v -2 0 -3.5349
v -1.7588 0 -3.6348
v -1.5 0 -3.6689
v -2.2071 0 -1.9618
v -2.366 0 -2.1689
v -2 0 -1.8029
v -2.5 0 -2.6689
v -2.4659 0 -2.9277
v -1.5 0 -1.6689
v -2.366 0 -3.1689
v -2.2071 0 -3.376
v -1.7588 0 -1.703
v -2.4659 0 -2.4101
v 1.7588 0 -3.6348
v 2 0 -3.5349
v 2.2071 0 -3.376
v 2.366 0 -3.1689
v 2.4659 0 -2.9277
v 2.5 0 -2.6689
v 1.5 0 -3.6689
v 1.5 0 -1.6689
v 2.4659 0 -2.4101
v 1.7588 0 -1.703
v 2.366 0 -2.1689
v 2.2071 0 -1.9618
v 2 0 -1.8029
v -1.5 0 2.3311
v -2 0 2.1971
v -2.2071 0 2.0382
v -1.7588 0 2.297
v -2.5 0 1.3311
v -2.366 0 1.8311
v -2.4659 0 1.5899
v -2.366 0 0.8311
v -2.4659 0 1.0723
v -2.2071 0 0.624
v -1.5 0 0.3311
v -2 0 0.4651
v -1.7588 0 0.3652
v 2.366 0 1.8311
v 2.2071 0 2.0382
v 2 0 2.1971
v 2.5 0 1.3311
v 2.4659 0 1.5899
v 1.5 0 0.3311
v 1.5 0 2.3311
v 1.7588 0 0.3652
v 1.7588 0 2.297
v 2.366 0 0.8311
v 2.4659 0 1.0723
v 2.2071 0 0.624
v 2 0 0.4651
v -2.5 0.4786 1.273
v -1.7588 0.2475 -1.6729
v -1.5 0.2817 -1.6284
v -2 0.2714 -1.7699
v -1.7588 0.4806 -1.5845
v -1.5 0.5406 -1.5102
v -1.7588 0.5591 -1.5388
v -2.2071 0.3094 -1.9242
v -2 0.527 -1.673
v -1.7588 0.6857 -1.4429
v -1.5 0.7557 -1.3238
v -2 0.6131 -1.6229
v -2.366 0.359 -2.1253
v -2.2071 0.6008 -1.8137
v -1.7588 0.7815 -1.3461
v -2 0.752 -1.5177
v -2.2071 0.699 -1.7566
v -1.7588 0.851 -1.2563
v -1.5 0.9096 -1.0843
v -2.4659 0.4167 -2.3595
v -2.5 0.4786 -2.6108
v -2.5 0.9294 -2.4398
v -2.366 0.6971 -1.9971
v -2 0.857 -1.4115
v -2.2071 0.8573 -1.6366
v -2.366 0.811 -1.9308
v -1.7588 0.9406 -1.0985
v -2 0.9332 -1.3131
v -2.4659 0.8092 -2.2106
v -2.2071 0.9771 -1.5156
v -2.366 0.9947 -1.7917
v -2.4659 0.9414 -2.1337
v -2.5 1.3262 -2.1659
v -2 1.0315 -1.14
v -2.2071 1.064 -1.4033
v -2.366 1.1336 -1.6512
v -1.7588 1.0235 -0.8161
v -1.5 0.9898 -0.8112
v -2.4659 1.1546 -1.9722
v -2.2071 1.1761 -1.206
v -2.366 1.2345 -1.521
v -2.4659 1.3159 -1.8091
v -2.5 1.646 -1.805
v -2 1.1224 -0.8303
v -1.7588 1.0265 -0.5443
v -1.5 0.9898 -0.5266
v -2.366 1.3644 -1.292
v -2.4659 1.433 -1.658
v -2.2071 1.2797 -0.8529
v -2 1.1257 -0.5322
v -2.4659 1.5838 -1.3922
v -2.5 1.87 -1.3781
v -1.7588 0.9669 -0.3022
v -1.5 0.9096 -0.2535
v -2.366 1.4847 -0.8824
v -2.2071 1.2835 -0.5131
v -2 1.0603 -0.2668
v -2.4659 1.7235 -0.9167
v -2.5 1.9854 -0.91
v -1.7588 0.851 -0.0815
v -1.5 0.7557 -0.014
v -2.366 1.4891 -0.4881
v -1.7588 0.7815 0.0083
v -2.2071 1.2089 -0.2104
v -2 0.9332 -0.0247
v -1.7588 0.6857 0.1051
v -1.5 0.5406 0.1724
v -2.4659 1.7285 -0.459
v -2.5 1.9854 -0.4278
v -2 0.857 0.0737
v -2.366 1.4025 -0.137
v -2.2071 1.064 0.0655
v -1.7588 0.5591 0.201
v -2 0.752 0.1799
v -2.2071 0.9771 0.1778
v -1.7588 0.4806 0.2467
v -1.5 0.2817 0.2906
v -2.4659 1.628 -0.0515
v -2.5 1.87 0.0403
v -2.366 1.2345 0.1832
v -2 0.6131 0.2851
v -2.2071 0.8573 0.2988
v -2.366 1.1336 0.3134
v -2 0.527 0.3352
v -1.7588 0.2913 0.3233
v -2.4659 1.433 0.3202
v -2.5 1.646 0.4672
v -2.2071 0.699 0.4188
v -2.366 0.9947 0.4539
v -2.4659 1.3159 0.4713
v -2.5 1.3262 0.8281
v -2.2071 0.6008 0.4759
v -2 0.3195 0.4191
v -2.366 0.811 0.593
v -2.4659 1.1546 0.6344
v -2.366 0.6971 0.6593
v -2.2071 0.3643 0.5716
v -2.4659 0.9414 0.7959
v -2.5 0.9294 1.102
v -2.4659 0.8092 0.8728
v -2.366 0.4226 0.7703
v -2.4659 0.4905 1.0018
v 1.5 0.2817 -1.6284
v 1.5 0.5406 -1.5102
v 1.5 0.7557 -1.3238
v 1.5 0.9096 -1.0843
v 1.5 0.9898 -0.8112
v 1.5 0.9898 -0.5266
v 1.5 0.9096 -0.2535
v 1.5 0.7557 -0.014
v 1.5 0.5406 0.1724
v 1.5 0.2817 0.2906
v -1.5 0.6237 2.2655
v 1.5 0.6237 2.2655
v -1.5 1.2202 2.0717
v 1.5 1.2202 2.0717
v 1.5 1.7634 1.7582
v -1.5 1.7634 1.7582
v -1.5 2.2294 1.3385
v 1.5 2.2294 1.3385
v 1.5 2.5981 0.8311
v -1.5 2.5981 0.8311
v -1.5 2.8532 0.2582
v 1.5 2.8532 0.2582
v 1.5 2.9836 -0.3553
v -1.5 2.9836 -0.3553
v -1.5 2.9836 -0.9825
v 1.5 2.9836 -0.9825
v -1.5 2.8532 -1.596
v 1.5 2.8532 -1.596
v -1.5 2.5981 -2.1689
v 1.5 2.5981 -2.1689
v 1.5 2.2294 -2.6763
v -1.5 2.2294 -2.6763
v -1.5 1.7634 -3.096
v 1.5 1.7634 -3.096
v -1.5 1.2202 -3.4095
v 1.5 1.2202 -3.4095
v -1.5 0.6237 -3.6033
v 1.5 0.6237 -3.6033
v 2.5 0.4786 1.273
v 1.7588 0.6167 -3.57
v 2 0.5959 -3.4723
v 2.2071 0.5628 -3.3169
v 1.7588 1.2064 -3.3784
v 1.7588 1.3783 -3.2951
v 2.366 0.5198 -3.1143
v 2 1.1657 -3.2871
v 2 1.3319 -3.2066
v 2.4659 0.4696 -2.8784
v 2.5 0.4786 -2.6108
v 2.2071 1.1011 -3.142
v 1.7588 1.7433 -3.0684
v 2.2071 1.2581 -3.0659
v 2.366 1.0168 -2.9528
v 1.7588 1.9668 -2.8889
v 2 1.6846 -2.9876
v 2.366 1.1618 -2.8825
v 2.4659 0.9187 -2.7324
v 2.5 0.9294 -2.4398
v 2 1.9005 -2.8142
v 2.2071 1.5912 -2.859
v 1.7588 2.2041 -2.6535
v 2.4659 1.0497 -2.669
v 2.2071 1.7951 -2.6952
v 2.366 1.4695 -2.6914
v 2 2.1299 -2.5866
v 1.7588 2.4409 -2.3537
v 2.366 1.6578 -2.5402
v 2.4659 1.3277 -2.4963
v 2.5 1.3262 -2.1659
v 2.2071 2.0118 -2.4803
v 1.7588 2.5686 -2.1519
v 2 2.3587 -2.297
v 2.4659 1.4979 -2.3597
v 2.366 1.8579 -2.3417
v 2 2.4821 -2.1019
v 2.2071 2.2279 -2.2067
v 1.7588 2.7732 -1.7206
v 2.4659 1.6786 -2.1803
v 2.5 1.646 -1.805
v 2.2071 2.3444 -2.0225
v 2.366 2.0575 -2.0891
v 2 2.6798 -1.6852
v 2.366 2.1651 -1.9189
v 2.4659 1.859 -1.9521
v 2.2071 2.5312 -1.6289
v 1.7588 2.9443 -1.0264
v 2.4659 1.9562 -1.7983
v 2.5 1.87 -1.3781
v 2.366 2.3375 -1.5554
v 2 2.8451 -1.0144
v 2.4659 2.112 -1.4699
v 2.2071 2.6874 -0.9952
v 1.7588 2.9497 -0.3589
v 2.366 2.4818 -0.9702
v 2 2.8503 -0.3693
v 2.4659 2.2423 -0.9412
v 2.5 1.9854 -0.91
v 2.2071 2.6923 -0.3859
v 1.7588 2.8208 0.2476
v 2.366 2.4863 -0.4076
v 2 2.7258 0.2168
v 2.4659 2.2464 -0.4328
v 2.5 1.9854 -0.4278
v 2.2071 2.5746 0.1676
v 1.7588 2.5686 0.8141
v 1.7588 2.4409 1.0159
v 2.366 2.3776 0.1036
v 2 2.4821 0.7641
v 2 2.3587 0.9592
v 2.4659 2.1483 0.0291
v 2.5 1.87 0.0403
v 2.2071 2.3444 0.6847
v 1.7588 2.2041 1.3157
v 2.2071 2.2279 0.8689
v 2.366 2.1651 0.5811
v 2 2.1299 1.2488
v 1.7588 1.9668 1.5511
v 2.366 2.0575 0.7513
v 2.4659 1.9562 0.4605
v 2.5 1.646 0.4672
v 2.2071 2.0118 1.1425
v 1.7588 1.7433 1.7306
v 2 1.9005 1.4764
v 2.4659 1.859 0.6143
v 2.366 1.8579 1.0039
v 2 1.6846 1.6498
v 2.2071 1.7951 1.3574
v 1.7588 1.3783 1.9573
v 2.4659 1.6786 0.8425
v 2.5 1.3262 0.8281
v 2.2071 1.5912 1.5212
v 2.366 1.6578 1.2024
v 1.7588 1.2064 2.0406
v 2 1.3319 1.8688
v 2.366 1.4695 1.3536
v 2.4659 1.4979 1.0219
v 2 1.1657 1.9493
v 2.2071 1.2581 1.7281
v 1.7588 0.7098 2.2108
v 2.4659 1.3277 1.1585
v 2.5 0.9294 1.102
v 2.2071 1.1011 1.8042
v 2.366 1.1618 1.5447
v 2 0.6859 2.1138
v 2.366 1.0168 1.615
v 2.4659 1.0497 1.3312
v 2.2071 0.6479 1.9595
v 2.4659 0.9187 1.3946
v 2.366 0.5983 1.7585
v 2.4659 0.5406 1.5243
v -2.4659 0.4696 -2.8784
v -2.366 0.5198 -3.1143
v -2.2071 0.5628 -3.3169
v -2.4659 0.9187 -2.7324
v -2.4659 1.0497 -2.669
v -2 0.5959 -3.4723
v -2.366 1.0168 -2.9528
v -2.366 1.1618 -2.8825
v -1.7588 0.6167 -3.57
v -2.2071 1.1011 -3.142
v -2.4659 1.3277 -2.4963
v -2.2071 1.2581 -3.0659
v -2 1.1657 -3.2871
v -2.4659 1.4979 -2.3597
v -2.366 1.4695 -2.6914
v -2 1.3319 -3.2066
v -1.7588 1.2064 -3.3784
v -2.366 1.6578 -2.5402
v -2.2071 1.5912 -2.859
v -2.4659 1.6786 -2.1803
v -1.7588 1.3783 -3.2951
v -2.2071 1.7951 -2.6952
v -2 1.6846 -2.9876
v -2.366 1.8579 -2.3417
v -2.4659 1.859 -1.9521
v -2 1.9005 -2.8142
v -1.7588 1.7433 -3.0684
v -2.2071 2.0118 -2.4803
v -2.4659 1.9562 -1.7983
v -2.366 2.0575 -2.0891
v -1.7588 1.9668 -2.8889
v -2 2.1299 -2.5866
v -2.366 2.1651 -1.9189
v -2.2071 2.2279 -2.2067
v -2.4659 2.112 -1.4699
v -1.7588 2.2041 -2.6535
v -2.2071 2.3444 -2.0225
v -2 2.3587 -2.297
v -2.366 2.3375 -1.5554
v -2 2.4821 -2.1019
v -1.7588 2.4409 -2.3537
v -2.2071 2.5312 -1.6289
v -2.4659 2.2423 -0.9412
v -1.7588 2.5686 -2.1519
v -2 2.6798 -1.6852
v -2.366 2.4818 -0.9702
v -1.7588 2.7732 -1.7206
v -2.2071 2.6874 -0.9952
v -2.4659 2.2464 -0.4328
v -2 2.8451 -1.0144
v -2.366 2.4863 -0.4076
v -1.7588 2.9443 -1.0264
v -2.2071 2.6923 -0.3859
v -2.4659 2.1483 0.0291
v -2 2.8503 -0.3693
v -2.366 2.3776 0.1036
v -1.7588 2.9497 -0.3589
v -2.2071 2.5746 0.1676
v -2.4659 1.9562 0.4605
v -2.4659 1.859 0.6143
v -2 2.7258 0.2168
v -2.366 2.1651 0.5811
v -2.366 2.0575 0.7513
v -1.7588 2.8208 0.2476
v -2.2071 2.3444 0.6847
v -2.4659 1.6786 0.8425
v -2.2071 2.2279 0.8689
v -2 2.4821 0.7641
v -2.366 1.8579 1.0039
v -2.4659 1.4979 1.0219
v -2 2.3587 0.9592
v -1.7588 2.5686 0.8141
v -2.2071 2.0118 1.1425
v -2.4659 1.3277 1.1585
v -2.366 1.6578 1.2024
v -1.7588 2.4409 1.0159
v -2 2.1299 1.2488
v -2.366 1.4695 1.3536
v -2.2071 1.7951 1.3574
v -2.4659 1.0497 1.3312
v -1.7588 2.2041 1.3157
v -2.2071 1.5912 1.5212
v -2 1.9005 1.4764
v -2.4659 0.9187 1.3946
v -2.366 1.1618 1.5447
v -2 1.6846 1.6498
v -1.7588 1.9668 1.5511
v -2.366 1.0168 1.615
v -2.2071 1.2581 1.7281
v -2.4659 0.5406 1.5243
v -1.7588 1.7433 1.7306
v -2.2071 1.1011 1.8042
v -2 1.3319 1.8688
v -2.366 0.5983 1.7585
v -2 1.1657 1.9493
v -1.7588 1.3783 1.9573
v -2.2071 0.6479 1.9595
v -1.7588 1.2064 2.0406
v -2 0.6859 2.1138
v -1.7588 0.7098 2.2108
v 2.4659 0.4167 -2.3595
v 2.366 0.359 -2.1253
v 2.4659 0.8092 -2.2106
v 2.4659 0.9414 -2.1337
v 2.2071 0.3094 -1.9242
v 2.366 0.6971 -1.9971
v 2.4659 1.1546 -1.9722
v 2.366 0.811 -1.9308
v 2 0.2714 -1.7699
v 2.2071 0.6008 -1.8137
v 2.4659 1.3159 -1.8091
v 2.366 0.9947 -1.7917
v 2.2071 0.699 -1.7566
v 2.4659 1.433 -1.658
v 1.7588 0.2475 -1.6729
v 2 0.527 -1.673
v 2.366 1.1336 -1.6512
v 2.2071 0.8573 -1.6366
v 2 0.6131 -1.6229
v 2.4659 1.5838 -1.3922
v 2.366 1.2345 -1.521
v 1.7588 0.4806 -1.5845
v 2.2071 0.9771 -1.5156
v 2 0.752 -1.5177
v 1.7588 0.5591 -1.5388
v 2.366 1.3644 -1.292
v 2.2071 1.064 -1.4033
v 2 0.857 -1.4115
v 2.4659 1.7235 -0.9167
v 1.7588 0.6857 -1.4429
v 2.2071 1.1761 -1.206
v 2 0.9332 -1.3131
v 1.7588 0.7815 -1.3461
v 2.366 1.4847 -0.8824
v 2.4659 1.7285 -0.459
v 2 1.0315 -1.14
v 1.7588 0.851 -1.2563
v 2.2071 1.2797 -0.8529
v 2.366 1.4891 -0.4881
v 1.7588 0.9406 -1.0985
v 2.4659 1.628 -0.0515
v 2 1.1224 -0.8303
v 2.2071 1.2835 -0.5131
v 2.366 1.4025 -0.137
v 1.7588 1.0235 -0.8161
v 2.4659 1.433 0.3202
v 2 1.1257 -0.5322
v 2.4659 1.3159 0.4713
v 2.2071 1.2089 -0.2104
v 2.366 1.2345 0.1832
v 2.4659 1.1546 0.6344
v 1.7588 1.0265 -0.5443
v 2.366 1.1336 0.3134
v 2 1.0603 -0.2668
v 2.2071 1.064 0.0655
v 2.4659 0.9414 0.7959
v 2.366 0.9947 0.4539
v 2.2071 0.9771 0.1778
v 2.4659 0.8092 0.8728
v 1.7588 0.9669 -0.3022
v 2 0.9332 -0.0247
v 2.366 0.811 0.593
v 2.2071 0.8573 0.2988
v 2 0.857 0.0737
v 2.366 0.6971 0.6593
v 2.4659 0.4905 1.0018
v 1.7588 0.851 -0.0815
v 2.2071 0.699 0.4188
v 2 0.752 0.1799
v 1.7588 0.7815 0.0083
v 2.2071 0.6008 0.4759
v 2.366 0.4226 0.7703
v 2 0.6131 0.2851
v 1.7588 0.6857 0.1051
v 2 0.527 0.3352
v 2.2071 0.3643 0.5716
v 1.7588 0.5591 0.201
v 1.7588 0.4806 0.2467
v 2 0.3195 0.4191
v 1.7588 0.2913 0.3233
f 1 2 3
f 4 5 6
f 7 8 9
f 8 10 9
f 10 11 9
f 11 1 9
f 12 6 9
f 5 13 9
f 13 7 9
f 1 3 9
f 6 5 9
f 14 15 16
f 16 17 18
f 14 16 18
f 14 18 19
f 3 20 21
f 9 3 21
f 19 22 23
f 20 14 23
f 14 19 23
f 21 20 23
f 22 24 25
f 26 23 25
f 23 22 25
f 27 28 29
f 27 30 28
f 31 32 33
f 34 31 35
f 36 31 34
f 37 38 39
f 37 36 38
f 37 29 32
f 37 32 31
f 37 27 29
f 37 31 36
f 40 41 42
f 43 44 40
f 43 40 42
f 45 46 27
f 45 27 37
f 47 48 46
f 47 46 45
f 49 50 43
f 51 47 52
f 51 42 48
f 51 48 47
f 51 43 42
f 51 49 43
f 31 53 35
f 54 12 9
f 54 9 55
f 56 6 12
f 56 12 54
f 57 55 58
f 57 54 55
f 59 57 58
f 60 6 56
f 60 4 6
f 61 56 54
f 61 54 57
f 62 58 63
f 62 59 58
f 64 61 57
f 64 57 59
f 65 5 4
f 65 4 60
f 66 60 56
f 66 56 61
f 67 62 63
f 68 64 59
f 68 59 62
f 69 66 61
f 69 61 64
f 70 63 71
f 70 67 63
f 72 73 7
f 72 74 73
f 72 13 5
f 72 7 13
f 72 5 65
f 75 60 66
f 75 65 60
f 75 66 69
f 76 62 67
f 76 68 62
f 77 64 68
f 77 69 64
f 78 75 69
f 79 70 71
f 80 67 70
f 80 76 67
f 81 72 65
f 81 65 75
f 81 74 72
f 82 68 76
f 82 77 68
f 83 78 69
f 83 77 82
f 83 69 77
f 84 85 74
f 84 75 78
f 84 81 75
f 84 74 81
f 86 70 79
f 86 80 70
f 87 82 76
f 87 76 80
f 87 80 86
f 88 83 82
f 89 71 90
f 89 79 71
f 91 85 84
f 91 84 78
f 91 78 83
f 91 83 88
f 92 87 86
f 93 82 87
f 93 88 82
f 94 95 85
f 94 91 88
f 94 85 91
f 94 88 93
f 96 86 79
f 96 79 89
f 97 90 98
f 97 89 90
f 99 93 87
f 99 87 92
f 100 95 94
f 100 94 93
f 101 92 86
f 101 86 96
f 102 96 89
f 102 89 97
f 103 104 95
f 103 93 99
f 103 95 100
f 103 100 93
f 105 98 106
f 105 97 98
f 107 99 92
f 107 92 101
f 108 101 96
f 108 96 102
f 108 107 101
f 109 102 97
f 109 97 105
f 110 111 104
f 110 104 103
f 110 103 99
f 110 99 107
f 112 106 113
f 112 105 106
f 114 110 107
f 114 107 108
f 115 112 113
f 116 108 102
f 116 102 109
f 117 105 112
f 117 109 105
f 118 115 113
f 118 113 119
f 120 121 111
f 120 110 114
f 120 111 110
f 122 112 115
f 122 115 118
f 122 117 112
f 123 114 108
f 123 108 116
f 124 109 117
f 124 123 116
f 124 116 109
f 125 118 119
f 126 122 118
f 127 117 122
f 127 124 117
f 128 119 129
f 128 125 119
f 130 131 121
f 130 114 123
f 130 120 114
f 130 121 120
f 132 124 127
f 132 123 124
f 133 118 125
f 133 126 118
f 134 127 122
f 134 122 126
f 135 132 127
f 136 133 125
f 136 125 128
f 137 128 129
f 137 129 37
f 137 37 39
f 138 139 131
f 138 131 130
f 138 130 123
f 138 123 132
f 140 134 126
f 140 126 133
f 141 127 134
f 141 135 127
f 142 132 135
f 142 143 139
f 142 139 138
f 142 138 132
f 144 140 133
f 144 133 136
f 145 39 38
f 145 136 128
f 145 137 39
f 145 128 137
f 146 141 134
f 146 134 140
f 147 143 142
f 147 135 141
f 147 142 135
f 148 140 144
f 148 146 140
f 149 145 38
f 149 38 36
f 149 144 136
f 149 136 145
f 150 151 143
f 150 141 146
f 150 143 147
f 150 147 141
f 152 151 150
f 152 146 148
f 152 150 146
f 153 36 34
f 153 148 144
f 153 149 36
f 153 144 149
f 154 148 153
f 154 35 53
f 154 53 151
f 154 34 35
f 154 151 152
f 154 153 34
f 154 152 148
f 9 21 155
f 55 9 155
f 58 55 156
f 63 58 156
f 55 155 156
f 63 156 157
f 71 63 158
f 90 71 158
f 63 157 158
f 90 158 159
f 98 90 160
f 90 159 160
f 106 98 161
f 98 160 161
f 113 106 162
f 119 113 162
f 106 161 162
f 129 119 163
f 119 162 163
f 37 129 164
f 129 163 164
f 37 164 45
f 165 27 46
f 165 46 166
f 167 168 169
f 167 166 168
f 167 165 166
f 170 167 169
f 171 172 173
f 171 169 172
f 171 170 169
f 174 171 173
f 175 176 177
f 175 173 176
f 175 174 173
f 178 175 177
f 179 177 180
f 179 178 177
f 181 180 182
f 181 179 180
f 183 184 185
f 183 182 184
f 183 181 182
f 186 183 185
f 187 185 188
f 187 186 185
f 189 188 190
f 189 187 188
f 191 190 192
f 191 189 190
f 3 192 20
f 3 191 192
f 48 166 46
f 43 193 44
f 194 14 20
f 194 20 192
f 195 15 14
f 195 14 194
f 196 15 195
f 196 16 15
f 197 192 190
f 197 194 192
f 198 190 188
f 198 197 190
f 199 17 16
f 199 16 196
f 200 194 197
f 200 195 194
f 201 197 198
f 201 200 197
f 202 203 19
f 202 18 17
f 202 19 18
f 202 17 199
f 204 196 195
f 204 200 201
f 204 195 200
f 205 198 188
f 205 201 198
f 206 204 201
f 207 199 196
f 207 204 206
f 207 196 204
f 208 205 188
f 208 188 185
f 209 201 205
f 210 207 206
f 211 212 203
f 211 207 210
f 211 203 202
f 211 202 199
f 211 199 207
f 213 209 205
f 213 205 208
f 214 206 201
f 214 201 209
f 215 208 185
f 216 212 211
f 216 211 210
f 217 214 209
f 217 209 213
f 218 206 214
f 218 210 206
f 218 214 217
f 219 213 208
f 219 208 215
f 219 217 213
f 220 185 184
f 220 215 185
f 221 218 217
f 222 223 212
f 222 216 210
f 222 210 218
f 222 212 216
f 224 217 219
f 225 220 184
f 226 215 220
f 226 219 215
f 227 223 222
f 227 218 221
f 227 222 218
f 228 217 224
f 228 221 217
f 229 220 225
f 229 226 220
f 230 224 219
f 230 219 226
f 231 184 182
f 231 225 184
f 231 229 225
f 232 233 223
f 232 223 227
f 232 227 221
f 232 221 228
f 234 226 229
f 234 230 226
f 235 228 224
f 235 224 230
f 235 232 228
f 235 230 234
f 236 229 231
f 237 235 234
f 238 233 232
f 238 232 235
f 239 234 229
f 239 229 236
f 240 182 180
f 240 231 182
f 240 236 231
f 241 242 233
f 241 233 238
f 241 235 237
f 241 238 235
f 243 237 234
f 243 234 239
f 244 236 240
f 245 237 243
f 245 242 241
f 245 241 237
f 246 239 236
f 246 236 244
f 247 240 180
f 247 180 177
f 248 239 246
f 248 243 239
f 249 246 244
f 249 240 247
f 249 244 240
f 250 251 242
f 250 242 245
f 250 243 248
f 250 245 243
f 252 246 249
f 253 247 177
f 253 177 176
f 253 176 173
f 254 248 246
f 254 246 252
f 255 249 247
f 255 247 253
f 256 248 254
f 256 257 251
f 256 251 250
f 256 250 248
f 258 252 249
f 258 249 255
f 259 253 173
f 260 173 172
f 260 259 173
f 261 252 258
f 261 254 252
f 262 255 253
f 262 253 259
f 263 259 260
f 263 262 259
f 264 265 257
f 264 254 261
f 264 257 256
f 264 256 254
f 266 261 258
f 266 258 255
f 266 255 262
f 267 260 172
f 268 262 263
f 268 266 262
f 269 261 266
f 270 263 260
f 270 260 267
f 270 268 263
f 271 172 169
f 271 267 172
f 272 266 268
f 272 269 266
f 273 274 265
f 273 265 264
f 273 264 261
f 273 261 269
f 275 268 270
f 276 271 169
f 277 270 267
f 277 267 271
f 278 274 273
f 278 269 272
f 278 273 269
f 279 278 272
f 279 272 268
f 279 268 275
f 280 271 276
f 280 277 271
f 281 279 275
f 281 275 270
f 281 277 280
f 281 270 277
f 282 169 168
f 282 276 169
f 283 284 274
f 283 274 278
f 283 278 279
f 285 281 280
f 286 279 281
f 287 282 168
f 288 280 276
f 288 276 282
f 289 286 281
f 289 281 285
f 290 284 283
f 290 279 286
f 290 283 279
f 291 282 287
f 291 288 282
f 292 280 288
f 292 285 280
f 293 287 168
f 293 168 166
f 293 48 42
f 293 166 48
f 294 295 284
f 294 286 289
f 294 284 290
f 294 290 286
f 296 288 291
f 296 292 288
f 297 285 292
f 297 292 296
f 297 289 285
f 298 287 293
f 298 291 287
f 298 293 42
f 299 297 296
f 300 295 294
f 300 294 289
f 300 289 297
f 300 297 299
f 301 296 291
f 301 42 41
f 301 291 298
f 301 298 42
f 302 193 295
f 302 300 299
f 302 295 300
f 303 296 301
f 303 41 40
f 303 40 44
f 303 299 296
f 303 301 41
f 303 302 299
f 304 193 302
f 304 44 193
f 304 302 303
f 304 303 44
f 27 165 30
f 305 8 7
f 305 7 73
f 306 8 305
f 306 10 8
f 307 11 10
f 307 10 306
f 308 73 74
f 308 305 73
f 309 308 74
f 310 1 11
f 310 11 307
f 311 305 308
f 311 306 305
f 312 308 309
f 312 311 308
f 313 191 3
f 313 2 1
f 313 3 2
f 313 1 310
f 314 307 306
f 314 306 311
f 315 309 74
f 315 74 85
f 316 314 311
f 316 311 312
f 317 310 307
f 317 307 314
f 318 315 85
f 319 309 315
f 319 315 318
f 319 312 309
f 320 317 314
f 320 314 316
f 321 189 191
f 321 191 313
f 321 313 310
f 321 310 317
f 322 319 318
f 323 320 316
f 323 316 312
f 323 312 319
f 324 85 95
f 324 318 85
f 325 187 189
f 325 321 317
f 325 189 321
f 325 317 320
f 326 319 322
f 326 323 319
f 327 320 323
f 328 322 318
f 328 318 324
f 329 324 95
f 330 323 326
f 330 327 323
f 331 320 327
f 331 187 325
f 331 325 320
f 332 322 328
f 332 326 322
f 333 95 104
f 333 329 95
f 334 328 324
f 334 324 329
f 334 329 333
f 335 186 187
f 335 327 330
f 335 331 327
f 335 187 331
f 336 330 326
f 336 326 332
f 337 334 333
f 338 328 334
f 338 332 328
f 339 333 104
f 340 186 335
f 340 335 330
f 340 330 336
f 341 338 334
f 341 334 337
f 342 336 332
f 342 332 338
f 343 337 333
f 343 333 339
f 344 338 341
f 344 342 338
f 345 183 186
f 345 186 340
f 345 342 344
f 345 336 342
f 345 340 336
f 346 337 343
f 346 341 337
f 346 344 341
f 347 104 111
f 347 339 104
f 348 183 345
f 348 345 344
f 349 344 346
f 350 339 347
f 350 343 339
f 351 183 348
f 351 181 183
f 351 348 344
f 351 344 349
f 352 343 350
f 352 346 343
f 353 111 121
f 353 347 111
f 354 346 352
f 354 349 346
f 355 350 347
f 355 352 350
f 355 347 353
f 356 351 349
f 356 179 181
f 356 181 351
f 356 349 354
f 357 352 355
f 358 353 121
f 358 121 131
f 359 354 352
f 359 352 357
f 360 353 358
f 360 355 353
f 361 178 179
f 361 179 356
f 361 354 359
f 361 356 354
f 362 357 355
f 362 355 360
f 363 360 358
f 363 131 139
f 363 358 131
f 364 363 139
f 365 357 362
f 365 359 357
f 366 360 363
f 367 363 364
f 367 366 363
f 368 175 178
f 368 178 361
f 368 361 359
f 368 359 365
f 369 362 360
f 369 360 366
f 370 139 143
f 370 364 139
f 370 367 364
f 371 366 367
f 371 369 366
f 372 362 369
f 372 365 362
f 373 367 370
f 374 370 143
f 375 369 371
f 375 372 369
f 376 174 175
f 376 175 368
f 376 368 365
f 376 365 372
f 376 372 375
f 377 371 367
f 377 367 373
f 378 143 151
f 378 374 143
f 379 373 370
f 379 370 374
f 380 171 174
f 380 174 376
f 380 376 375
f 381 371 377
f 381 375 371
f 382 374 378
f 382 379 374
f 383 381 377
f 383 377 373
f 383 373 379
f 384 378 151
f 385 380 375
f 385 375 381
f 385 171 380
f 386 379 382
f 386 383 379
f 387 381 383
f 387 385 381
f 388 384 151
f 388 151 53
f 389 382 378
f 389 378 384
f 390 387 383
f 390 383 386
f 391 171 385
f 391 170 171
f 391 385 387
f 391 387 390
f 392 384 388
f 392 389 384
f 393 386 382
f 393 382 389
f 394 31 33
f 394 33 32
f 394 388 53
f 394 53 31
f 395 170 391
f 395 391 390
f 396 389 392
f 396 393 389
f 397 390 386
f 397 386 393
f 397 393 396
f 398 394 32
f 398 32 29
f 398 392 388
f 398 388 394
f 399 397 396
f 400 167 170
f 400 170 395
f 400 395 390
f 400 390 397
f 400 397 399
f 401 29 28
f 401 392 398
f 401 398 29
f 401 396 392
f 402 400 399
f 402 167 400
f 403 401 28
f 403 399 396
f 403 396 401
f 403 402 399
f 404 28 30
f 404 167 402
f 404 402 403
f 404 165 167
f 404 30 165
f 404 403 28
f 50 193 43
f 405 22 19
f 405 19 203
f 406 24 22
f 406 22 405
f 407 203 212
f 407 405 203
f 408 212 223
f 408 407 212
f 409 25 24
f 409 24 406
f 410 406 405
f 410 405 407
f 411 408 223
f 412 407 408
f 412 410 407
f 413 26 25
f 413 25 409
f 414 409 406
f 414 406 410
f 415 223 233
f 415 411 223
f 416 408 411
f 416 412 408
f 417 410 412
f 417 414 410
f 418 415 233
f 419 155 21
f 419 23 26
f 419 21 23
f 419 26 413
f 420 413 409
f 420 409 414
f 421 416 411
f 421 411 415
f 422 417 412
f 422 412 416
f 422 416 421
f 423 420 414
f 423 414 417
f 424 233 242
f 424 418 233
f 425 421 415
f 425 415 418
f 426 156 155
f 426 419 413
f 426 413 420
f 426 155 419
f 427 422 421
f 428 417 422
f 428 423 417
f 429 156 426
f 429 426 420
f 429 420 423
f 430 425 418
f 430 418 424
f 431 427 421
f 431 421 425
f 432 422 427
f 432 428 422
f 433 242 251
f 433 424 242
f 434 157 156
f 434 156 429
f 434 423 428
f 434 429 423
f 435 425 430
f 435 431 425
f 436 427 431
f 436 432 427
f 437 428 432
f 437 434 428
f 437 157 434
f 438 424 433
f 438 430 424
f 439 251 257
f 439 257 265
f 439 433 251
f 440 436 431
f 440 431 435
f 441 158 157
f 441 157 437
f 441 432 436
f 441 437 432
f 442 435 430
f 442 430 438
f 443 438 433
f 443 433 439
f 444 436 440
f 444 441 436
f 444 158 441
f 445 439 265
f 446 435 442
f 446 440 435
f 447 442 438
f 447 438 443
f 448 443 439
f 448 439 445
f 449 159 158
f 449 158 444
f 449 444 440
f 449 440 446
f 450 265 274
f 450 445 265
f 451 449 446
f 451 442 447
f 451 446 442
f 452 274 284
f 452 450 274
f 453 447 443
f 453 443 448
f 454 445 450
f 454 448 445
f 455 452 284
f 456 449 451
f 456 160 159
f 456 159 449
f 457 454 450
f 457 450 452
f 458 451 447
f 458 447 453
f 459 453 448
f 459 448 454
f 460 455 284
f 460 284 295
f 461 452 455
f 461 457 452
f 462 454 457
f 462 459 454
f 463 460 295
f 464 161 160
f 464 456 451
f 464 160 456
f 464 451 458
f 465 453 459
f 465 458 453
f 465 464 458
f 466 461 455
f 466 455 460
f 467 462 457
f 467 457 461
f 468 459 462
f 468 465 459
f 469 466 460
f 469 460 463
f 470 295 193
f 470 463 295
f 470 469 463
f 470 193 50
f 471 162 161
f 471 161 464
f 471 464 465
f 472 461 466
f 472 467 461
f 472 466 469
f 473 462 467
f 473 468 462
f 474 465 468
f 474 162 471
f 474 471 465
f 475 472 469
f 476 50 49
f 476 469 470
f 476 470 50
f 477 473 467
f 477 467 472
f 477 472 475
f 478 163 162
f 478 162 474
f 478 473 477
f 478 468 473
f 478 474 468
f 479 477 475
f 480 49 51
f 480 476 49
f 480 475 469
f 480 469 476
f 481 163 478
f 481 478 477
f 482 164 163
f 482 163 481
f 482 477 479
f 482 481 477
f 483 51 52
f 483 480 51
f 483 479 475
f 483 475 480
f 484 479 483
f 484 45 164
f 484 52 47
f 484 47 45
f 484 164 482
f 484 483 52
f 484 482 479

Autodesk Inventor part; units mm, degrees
ref_plane "YZ Plane" through (0, 0, 0) normal (1, 0, 0) x (0, 1, 0)
ref_plane "XZ Plane" through (0, 0, 0) normal (0, 1, 0) x (-1, 0, 0)
ref_plane "XY Plane" through (0, 0, 0) normal (0, 0, 1) x (1, 0, 0)
sketch "Sketch1" plane through (0, 0, 0) normal (0, 1, 0) x (-1, 0, 0)
  line L0 (1.5, -1.6689) -> (-1.5, -1.6689)
  line L1 (-1.5, -3.6689) -> (1.5, -3.6689)
  arc A0 (2.5, -2.6689) -> (1.5, -1.6689) centre (1.5, -2.6689) ccw
  arc A1 (1.5, -3.6689) -> (2.5, -2.6689) centre (1.5, -2.6689) ccw
  arc A2 (-2.5, -2.6689) -> (-1.5, -3.6689) centre (-1.5, -2.6689) ccw
  arc A3 (-1.5, -1.6689) -> (-2.5, -2.6689) centre (-1.5, -2.6689) ccw
  line L2 (1.5, -2.6689) -> (-1.5, -2.6689) construction
  point P0 (2.5, -1.6689)
  point P1 (-2.5, -3.6689)
  point P2 (2.5, -3.6689)
  point P3 (-2.5, -2.6689)
  dimension "d1" = 5
  dimension "d2" = 2
  dimension "d3" = 1
  dimension "d4" = 1
sketch "Sketch2" plane through (0, 0, 0) normal (1, 0, 0) x (0, 1, 0)
  line L0 (0, -2.6689) -> (0, 1.3311) construction
  arc A0 (0, -2.6689) -> (0, 1.3311) centre (0, -0.6689) ccw
  point P0 (0, 0)
  dimension "d5" = 4
sweep "Sweep1" add profiles "Sketch1" path "Sketch2"
properties part number "seguro"
